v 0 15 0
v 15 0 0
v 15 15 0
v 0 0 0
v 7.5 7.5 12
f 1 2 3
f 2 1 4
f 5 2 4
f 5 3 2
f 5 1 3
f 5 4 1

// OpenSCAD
// Showcase 2: 3D Pyramid
// Define the 5 vertices of a square-based pyramid
pyramid_points = [
  [0, 0, 0],     // 0: Base Bottom-Left
  [15, 0, 0],    // 1: Base Bottom-Right
  [15, 15, 0],   // 2: Base Top-Right
  [0, 15, 0],    // 3: Base Top-Left
  [7.5, 7.5, 12] // 4: Apex (Tip)
];

// Define the 5 polygonal faces (vertices in CCW order from the outside)
pyramid_faces = [
  [3, 2, 1, 0],  // Square base face
  [0, 1, 4],     // Side triangle 1
  [1, 2, 4],     // Side triangle 2
  [2, 3, 4],     // Side triangle 3
  [3, 0, 4]      // Side triangle 4
];

polyhedron(points=pyramid_points, faces=pyramid_faces);
